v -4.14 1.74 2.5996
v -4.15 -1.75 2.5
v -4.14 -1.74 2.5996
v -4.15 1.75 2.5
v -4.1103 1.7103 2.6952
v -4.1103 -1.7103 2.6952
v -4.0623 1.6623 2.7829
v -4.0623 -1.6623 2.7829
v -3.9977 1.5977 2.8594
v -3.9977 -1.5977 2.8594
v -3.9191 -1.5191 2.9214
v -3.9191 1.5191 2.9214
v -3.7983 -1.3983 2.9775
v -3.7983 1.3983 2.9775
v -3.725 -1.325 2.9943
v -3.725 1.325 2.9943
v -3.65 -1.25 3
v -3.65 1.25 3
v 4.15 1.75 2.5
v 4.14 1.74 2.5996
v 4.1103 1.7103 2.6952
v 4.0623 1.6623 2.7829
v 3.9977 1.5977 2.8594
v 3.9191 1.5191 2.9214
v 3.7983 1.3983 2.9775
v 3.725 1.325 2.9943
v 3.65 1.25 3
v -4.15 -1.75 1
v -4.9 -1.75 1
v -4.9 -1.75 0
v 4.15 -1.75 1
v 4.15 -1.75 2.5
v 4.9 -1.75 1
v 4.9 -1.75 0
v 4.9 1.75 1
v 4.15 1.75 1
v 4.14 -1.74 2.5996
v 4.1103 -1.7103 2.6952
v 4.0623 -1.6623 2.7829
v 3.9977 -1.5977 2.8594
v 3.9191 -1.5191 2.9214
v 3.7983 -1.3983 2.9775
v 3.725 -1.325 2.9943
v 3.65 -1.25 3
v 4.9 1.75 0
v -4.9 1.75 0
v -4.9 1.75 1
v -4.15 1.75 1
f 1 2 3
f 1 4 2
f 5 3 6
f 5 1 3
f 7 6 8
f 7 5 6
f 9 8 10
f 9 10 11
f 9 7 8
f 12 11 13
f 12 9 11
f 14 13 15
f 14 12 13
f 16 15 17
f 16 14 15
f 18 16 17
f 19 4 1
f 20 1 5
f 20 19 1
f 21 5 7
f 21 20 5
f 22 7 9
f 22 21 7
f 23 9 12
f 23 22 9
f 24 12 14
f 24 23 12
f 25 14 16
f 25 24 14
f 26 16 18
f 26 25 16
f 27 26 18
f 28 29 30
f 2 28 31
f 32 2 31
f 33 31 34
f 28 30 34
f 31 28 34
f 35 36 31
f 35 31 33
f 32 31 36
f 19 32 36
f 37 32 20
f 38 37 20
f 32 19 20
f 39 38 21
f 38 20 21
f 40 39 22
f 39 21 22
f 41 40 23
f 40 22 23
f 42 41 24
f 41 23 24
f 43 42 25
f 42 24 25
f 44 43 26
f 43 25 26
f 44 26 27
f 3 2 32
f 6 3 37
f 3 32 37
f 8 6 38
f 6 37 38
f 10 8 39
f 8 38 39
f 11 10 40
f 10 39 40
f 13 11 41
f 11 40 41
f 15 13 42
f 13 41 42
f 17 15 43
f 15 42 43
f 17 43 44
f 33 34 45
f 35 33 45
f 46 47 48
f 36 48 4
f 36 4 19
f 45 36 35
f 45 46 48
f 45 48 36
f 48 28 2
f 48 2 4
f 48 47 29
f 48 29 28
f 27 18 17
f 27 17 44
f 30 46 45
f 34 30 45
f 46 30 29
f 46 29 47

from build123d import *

# Parameters (mm, degrees)
SKETCH_1_W      = 9.8
SKETCH_1_H      = 3.5
EXTRUDE_1_DEPTH = 1
SKETCH_2_W      = 8.3
SKETCH_2_H      = 3.5
EXTRUDE_2_DEPTH = 2
FILLET_2_R      = 0.5


with BuildPart() as part:
    # 草图1 → 凸台-拉伸1 (new body)
    with BuildSketch(Plane.XY):
        Rectangle(SKETCH_1_W, SKETCH_1_H)
    extrude(amount=EXTRUDE_1_DEPTH)

    # 草图2 → 凸台-拉伸2 (add)
    with BuildSketch(Plane.XY.offset(1)):
        Rectangle(SKETCH_2_W, SKETCH_2_H)
    extrude(amount=EXTRUDE_2_DEPTH)

    # 圆角2
    fillet_2_edges = [part.edges().sort_by_distance(p)[0] for p in [
        (4.15, 0, 3),
        (0, 1.75, 3),
        (-4.15, 0, 3),
        (0, -1.75, 3),
    ]]
    fillet(fillet_2_edges, radius=FILLET_2_R)


solid = part.part
